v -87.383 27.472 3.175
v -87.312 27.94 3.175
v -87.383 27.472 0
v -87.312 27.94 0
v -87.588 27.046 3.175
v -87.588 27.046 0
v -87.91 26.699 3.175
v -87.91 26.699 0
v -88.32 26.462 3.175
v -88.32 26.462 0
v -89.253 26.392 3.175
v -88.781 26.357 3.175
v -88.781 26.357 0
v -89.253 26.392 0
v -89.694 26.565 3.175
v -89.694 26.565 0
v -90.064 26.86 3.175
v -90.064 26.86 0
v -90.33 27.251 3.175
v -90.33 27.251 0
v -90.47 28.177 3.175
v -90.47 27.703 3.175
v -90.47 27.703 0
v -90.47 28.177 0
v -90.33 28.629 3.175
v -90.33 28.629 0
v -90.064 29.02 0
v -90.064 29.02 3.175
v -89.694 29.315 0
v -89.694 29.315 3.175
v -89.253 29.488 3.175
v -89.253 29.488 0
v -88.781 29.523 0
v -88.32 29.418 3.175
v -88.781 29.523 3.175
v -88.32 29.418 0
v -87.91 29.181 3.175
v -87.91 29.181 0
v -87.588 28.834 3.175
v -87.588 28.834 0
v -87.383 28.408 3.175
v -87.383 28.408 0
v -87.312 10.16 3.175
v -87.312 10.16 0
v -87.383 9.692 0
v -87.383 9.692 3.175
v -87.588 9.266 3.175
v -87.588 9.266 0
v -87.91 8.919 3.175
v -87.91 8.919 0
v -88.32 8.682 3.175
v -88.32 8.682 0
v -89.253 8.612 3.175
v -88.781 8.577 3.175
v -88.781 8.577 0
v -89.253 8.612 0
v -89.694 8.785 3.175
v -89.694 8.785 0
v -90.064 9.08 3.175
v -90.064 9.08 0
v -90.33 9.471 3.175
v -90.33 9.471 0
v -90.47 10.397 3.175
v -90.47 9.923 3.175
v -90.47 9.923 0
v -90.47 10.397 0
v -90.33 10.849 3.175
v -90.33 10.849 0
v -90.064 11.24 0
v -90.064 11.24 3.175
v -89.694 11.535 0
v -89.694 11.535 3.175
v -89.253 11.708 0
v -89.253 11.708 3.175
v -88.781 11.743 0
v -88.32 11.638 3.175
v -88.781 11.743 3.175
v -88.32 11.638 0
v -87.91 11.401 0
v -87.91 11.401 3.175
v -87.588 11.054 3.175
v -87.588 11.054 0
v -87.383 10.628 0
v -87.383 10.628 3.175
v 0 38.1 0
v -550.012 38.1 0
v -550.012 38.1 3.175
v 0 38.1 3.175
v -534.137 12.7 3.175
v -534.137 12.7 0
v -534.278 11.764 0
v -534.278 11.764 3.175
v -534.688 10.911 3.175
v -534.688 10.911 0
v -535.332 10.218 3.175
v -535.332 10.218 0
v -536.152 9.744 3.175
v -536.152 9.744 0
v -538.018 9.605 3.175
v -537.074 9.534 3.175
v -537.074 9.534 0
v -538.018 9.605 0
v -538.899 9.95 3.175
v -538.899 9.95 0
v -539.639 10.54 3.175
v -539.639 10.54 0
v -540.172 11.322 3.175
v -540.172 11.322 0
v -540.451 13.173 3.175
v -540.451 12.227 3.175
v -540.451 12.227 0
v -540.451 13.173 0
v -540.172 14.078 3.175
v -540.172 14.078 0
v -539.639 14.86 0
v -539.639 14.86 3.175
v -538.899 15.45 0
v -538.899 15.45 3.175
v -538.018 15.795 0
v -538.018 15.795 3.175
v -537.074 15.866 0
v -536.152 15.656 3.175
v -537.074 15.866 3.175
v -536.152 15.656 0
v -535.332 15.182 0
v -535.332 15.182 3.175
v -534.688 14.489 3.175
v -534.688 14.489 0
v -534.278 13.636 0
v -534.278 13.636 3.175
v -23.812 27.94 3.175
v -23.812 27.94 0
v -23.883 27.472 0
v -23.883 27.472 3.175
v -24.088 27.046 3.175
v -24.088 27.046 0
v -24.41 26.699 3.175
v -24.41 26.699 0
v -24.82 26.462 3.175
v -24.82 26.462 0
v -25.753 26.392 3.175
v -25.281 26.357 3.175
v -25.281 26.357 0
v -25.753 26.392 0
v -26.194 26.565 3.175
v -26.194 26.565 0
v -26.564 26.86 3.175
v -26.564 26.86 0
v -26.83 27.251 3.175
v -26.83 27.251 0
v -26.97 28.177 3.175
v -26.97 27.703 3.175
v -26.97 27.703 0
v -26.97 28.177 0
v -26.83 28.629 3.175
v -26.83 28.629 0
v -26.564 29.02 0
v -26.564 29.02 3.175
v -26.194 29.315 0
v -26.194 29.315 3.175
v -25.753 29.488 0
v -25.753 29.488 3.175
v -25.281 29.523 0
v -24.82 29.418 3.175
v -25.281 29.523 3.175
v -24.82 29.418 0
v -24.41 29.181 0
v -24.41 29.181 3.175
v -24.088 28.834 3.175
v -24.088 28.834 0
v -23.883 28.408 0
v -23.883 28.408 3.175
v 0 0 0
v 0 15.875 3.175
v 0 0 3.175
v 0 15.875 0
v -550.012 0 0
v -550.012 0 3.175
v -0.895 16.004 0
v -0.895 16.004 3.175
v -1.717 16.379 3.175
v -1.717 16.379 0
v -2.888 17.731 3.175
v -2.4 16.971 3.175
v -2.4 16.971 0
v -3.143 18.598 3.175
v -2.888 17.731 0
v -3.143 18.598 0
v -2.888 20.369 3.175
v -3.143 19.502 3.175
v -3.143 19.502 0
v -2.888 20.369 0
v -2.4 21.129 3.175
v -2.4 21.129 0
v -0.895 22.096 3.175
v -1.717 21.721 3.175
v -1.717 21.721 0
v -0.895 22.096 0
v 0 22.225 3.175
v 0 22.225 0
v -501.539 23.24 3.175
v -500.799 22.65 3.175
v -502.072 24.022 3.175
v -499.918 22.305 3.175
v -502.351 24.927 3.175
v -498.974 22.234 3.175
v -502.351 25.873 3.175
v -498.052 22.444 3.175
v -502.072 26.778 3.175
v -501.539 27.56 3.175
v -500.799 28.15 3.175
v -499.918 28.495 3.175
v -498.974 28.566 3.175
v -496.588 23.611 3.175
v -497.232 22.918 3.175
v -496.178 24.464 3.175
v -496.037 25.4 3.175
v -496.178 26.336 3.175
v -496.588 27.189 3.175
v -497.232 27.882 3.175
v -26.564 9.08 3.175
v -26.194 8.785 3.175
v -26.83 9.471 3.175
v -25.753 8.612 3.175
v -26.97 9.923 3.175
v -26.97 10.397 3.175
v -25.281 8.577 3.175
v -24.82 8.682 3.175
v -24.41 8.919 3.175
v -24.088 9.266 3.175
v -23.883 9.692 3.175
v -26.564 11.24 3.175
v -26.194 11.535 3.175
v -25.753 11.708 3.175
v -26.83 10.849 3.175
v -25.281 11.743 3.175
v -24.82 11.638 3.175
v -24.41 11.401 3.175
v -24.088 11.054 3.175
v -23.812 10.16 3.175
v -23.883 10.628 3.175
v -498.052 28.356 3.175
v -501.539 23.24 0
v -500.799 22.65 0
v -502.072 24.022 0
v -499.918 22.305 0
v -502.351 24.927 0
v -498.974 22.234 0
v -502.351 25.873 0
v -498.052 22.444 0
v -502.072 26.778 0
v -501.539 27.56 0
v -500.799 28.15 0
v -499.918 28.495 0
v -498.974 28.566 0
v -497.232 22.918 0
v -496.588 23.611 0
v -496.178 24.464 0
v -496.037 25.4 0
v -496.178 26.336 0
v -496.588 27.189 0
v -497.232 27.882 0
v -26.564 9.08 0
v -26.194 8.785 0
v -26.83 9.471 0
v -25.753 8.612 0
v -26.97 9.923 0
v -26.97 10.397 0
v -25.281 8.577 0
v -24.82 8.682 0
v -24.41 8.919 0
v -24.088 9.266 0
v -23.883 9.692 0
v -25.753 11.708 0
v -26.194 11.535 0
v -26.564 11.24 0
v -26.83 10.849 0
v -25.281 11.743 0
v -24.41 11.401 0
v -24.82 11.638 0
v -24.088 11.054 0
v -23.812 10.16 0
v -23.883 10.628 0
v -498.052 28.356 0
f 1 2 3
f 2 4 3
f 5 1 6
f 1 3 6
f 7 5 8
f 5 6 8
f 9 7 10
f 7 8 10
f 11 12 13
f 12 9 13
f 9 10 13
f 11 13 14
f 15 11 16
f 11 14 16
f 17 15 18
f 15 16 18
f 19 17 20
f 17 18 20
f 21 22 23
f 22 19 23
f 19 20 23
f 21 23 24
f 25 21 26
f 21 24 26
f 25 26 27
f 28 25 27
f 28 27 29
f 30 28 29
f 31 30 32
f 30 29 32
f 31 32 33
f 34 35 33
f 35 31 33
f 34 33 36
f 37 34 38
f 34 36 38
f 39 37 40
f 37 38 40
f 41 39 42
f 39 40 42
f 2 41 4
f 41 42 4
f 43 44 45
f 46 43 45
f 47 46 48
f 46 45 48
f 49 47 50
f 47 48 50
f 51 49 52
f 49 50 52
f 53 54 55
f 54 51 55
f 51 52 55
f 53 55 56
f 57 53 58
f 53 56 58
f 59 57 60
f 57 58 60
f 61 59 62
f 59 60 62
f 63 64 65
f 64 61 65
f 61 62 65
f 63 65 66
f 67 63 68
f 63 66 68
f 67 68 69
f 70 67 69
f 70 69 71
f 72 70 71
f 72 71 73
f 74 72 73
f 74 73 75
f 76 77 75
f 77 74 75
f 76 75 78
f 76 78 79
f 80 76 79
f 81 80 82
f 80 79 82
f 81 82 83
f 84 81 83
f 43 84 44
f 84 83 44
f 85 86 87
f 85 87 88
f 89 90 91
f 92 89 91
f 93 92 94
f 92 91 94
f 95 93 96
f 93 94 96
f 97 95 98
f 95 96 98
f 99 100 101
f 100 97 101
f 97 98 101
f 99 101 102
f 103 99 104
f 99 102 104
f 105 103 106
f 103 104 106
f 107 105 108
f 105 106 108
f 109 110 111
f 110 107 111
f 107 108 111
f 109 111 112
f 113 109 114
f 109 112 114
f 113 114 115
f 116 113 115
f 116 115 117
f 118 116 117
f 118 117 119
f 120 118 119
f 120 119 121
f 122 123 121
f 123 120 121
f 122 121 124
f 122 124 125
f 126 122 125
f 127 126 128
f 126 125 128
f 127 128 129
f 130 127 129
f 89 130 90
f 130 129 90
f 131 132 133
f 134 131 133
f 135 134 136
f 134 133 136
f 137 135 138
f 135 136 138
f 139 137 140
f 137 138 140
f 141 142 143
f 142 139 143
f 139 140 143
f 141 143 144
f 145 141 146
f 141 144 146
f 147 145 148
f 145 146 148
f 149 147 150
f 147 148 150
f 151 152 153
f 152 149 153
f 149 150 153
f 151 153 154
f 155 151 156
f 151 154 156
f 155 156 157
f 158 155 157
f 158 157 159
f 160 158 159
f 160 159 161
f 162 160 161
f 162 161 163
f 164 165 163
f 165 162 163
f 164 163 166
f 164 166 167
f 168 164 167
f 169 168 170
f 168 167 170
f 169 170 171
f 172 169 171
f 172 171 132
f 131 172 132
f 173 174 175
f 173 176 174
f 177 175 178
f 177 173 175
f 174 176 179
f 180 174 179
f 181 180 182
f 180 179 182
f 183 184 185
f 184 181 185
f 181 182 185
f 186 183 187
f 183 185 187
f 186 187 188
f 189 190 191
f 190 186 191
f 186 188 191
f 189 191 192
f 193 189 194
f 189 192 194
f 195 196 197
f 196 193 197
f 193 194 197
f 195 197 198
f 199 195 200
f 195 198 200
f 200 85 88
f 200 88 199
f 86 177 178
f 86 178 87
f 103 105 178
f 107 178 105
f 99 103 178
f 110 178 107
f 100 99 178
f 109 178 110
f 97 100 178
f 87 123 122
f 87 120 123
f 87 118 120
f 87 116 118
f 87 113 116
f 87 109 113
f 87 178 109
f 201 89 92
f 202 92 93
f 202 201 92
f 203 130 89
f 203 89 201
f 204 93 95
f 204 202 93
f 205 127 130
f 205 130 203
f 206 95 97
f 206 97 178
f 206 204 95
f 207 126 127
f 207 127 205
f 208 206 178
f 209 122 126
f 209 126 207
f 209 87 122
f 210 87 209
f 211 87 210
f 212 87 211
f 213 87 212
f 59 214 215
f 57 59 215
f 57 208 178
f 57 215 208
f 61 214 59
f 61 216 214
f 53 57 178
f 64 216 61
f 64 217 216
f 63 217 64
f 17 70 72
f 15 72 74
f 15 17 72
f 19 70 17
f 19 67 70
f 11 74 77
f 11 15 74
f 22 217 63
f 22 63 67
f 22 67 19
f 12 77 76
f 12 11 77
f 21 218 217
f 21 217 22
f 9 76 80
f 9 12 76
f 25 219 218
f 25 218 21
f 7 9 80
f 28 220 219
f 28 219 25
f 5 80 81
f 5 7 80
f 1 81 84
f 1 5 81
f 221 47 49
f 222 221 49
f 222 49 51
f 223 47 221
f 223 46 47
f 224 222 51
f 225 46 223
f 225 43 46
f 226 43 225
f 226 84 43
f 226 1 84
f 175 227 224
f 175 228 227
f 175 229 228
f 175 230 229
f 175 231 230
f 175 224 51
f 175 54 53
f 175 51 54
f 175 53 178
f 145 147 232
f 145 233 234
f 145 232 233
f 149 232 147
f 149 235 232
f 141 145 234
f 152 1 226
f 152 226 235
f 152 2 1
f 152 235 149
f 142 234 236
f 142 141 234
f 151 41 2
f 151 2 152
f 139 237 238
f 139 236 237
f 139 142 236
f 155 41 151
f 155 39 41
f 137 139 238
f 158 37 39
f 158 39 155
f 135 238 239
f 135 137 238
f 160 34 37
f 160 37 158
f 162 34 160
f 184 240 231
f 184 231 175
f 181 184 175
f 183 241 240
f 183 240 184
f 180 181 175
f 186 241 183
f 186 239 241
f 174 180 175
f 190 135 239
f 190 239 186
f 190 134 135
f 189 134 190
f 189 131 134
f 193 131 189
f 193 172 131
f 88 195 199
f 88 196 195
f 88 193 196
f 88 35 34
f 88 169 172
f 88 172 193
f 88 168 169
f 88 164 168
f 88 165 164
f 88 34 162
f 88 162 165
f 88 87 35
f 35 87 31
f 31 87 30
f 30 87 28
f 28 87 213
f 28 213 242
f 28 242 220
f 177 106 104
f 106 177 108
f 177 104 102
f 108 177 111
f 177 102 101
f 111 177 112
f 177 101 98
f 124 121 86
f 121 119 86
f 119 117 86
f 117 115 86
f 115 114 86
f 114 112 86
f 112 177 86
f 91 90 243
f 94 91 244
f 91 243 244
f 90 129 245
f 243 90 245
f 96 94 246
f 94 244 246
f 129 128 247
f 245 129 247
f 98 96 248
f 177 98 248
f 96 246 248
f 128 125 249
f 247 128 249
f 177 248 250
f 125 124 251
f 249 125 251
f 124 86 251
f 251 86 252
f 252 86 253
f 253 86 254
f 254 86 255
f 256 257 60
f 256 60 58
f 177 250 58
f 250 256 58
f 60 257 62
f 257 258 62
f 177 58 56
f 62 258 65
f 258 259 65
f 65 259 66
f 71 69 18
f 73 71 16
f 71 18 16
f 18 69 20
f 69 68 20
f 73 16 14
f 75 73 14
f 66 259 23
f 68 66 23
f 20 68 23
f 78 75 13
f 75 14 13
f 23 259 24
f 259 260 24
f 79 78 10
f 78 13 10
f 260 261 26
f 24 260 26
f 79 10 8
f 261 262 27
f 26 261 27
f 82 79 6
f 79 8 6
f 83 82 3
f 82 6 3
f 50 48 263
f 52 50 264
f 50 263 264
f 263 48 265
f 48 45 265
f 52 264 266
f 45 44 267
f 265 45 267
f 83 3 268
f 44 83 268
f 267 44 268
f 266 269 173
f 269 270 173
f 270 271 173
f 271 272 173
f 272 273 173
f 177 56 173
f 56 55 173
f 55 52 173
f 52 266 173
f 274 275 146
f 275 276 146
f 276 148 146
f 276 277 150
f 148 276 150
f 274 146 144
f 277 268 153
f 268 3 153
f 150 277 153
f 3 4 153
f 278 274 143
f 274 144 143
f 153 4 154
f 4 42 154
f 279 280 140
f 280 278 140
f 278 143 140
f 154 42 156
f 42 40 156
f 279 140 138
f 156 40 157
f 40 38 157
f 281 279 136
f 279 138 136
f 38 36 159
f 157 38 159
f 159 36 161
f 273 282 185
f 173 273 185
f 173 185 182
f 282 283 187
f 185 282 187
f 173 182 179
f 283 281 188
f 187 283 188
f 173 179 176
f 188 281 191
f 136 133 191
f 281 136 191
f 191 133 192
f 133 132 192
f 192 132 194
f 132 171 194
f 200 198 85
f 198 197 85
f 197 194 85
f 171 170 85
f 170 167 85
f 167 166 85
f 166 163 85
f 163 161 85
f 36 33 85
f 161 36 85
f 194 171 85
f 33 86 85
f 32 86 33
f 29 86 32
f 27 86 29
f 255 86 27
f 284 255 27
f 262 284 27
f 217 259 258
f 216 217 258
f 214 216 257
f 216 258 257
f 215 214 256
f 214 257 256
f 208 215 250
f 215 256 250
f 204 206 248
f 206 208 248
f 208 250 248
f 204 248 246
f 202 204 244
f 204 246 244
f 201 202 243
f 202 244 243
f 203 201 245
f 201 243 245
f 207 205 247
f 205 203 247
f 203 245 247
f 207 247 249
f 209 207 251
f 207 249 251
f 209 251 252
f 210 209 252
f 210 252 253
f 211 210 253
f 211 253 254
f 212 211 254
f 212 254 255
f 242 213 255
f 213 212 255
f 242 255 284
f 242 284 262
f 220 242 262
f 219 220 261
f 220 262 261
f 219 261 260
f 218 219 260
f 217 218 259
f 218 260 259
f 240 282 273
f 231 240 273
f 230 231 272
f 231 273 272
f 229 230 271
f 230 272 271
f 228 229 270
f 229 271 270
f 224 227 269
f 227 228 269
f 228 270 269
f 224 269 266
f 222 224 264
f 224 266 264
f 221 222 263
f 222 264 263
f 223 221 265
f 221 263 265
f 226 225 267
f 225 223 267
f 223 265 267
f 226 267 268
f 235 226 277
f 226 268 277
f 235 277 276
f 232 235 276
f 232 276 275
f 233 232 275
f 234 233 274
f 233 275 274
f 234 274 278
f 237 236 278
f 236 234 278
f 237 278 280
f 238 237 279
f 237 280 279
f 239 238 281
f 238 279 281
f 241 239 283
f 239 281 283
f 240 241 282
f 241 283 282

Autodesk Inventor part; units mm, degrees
ref_plane "YZ Plane" through (0, 0, 0) normal (1, 0, 0) x (0, 1, 0)
ref_plane "XZ Plane" through (0, 0, 0) normal (0, 1, 0) x (-1, 0, 0)
ref_plane "XY Plane" through (0, 0, 0) normal (0, 0, 1) x (1, 0, 0)
sketch "Sketch1" plane through (0, 0, 0) normal (0, 0, 1) x (1, 0, 0)
  line L0 (0, 0) -> (-550.0116, 0)
  line L1 (-550.0116, 0) -> (-550.0116, 38.1)
  line L2 (-550.0116, 38.1) -> (0, 38.1)
  line L3 (0, 38.1) -> (0, 0)
  circle A0 centre (0, 19.05) radius 3.175
  circle A1 centre (-25.4, 10.16) radius 1.5875
  circle A2 centre (-25.4, 27.94) radius 1.5875
  circle A3 centre (-88.9, 27.94) radius 1.5875
  circle A4 centre (-88.9, 10.16) radius 1.5875
  circle A5 centre (-499.2116, 25.4) radius 3.175
  circle A6 centre (-537.3116, 12.7) radius 3.175
  point P0 (0, 15.875)
  point P1 (0, 22.225)
  dimension "d0" = 38.1
  dimension "d1" = 550.0116
  dimension "d2" = 6.35
  dimension "d3" = 3.175
  dimension "d4" = 3.175
  dimension "d5" = 3.175
  dimension "d6" = 3.175
  dimension "d7" = 10.16
  dimension "d8" = 10.16
  dimension "d9" = 10.16
  dimension "d10" = 10.16
  dimension "d11" = 25.4
  dimension "d12" = 25.4
  dimension "d13" = 88.9
  dimension "d14" = 88.9
  dimension "d15" = 6.35
  dimension "d16" = 6.35
  dimension "d18" = 50.8
  dimension "d19" = 12.7
  dimension "d23" = 12.7
  dimension "d24" = 12.7
extrude "Extrusion1" add sketch "Sketch1" along normal blind 3.175 contours L0 L1 L2 L3 A0
properties part number "arm projectile"
